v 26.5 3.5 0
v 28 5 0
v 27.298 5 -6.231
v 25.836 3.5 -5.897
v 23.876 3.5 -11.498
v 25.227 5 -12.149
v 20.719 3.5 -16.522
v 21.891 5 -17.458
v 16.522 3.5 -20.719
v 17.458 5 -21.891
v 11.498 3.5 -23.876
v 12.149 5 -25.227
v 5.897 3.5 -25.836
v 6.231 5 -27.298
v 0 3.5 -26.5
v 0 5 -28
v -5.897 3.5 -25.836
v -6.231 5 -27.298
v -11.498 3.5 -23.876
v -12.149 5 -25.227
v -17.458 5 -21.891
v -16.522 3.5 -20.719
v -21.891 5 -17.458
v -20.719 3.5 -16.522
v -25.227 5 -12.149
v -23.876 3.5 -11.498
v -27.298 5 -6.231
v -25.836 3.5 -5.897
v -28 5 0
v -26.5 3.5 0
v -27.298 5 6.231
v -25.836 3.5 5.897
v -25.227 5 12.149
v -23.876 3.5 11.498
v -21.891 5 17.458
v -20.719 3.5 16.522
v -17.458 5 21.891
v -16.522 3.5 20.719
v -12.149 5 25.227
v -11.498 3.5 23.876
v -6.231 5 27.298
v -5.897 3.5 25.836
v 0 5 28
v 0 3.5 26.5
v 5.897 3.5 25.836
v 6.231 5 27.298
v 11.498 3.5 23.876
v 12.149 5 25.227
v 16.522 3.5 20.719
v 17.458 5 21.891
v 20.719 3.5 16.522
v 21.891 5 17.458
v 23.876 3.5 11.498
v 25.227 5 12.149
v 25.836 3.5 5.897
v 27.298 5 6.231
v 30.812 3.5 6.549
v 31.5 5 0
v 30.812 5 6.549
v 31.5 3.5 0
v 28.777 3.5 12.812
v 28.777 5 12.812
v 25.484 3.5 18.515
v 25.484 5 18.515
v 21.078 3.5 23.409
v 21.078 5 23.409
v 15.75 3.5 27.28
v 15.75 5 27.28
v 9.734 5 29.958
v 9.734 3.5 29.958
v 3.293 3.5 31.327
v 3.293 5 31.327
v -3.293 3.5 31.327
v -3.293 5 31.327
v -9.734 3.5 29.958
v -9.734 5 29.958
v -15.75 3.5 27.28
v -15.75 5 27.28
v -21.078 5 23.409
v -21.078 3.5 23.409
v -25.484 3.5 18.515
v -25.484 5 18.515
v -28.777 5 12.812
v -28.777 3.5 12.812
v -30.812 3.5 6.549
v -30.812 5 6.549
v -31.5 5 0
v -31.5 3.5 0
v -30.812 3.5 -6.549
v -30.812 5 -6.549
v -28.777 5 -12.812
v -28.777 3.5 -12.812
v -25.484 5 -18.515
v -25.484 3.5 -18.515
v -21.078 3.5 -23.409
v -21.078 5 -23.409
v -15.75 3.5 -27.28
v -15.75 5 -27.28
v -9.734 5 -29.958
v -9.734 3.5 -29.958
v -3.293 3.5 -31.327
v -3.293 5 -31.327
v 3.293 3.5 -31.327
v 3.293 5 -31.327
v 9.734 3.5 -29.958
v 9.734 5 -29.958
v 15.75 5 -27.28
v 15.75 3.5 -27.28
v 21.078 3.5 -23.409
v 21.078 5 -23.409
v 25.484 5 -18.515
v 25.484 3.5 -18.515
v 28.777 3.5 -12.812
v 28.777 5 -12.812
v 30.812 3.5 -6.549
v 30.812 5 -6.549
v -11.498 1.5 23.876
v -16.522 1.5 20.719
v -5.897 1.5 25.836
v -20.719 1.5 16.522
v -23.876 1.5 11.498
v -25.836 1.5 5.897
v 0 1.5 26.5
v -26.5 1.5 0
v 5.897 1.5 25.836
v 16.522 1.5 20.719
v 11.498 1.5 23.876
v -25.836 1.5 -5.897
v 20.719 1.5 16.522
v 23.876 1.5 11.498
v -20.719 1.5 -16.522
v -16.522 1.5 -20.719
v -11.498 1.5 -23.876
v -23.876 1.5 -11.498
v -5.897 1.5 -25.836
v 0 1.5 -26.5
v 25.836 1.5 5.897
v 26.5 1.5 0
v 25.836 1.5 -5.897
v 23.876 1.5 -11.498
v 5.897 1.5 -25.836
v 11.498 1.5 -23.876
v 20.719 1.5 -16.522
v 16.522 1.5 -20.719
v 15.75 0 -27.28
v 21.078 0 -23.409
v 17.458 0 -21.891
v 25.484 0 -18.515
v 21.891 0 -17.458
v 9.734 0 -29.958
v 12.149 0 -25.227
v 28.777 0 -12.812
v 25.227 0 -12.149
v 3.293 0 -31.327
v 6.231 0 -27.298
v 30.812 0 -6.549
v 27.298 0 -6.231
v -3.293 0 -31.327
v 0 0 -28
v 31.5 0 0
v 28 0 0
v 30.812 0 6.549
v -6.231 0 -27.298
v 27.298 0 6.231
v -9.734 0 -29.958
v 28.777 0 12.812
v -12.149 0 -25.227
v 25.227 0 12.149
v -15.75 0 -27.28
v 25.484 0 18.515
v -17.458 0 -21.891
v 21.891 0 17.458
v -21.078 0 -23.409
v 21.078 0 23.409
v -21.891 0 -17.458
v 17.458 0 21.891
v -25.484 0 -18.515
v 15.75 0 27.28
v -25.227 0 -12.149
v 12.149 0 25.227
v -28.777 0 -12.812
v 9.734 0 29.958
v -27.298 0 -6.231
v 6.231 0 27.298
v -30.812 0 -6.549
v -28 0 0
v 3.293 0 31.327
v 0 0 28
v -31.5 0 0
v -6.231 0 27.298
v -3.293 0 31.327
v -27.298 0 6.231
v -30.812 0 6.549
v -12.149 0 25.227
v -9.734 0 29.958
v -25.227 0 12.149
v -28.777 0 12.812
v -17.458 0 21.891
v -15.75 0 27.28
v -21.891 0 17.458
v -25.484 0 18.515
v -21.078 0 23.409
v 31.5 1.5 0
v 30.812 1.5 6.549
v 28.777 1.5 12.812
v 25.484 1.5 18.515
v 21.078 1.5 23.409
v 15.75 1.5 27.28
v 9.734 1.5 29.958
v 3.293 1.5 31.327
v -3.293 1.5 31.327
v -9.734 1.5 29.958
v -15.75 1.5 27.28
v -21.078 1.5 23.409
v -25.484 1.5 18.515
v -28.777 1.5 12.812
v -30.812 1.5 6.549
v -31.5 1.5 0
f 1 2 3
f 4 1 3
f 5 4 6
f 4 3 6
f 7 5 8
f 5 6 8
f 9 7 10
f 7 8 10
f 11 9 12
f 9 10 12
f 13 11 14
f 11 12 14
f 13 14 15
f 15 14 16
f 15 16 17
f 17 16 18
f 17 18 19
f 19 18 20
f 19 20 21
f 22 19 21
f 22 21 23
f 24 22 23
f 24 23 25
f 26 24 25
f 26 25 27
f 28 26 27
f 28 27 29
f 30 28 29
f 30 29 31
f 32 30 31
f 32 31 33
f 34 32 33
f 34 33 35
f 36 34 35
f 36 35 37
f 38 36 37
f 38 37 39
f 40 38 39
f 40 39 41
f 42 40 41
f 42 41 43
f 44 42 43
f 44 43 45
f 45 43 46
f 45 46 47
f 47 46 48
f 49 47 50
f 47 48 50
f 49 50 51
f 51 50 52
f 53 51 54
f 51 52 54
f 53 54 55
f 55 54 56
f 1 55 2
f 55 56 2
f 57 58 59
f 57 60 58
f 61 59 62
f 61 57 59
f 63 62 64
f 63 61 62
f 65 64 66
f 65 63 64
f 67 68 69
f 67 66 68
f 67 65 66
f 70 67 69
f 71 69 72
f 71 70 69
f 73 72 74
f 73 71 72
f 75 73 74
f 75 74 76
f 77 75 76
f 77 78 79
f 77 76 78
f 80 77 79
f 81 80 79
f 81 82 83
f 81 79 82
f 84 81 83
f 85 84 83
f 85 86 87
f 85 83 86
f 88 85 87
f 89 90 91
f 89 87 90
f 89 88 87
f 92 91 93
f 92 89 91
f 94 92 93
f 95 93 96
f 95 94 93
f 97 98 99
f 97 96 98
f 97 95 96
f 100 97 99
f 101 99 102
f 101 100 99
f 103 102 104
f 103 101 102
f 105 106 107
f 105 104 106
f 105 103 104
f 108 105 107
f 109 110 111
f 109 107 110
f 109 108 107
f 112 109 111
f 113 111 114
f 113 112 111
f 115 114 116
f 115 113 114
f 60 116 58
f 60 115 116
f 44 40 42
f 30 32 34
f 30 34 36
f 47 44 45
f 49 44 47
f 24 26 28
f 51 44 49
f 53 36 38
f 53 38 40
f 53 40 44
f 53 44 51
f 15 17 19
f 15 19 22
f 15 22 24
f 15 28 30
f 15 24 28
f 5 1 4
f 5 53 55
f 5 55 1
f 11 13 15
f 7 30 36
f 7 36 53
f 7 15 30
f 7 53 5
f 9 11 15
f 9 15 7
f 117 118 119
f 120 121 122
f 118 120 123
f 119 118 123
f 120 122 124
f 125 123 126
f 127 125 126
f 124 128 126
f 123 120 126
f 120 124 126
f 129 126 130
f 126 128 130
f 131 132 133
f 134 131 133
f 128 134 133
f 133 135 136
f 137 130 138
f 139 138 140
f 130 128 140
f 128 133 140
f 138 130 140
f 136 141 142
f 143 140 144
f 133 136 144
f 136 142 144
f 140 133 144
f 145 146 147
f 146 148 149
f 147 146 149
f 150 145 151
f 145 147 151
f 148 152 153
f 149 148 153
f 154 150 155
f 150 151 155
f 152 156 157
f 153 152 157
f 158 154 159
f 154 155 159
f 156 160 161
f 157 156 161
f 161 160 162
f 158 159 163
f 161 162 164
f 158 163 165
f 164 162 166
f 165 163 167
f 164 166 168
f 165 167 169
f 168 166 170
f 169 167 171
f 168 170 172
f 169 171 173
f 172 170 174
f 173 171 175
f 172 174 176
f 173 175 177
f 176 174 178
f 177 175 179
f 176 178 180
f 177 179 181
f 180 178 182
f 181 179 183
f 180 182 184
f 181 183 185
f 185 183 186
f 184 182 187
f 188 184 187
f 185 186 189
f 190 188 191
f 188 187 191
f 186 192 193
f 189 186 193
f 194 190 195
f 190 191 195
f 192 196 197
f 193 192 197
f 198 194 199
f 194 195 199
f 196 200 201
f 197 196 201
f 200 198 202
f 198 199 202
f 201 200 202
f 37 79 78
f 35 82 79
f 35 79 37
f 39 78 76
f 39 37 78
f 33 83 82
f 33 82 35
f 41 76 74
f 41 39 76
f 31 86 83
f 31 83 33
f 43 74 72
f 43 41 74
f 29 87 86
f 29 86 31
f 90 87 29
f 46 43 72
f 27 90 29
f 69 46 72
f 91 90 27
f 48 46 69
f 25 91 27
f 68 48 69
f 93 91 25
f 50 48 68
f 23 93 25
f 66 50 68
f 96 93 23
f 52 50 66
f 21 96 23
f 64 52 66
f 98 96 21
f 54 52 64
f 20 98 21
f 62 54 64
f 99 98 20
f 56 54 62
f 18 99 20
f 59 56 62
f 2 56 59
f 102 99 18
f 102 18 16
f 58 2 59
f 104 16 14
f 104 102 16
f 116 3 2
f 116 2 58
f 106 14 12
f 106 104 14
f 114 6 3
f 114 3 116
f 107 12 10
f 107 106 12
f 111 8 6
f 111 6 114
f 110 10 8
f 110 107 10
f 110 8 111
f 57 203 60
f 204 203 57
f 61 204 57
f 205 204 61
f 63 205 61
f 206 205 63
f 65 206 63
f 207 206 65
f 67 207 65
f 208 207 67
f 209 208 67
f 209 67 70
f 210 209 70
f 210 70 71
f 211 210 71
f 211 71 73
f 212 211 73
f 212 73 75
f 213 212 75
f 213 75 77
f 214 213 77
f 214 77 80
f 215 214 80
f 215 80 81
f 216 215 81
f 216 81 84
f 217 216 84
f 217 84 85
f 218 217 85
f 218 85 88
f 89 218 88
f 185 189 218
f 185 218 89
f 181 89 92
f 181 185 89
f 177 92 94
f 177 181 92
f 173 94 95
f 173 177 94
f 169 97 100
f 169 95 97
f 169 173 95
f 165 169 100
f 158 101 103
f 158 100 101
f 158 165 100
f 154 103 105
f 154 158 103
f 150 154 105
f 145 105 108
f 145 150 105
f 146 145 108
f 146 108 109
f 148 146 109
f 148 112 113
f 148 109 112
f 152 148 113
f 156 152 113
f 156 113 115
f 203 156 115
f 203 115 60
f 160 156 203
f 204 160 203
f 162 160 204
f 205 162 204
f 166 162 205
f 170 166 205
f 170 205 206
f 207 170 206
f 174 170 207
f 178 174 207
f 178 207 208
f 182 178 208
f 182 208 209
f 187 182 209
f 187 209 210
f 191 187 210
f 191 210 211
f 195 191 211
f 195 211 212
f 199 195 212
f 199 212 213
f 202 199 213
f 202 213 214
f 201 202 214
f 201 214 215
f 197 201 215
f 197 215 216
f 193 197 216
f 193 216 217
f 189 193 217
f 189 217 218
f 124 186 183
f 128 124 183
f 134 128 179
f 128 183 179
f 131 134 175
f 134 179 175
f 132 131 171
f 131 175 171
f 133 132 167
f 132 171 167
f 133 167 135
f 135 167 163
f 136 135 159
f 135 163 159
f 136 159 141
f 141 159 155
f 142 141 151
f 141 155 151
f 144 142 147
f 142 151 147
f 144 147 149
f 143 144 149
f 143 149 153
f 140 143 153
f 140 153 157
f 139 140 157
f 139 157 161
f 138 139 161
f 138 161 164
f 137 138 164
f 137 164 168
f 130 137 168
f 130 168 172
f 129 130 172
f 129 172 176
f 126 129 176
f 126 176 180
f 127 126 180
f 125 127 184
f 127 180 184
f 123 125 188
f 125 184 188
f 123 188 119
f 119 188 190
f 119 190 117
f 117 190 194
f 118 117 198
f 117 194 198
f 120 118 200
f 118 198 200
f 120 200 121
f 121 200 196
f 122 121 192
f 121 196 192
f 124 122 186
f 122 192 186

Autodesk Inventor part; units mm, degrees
ref_plane "YZ Plane" through (0, 0, 0) normal (1, 0, 0) x (0, 1, 0)
ref_plane "XZ Plane" through (0, 0, 0) normal (0, 1, 0) x (-1, 0, 0)
ref_plane "XY Plane" through (0, 0, 0) normal (0, 0, 1) x (1, 0, 0)
sketch "Skizze1" plane through (0, 0, 0) normal (0, 1, 0) x (-1, 0, 0)
  circle A0 centre (0, 0) radius 31.5
  circle A1 centre (0, 0) radius 26.5
  dimension "d0" = 63
  dimension "d1" = 53
extrude "Extrusion1" add sketch "Skizze1" along normal blind 1.5
sketch "Skizze2" plane through (0, 1.5, 0) normal (0, 1, 0) x (1, 0, 0)
  circle A0 centre (0, 0) radius 31.5
extrude "Extrusion2" add sketch "Skizze2" along normal blind 2
sketch "Skizze3" plane through (0, 3.5, 0) normal (0, 1, 0) x (1, 0, 0)
  circle A0 centre (0, 0) radius 31.5
  circle A1 centre (0, 0) radius 26.5
  dimension "d6" = 53
extrude "Extrusion3" add sketch "Skizze3" along normal blind 1.5
chamfer "Fase1" distance 1.5 angle 45 1 edges at (-26.5, 5, 0)
chamfer "Fase2" distance 1.5 angle 45 1 edges at (26.5, 0, 0)
properties part number "Puk"
